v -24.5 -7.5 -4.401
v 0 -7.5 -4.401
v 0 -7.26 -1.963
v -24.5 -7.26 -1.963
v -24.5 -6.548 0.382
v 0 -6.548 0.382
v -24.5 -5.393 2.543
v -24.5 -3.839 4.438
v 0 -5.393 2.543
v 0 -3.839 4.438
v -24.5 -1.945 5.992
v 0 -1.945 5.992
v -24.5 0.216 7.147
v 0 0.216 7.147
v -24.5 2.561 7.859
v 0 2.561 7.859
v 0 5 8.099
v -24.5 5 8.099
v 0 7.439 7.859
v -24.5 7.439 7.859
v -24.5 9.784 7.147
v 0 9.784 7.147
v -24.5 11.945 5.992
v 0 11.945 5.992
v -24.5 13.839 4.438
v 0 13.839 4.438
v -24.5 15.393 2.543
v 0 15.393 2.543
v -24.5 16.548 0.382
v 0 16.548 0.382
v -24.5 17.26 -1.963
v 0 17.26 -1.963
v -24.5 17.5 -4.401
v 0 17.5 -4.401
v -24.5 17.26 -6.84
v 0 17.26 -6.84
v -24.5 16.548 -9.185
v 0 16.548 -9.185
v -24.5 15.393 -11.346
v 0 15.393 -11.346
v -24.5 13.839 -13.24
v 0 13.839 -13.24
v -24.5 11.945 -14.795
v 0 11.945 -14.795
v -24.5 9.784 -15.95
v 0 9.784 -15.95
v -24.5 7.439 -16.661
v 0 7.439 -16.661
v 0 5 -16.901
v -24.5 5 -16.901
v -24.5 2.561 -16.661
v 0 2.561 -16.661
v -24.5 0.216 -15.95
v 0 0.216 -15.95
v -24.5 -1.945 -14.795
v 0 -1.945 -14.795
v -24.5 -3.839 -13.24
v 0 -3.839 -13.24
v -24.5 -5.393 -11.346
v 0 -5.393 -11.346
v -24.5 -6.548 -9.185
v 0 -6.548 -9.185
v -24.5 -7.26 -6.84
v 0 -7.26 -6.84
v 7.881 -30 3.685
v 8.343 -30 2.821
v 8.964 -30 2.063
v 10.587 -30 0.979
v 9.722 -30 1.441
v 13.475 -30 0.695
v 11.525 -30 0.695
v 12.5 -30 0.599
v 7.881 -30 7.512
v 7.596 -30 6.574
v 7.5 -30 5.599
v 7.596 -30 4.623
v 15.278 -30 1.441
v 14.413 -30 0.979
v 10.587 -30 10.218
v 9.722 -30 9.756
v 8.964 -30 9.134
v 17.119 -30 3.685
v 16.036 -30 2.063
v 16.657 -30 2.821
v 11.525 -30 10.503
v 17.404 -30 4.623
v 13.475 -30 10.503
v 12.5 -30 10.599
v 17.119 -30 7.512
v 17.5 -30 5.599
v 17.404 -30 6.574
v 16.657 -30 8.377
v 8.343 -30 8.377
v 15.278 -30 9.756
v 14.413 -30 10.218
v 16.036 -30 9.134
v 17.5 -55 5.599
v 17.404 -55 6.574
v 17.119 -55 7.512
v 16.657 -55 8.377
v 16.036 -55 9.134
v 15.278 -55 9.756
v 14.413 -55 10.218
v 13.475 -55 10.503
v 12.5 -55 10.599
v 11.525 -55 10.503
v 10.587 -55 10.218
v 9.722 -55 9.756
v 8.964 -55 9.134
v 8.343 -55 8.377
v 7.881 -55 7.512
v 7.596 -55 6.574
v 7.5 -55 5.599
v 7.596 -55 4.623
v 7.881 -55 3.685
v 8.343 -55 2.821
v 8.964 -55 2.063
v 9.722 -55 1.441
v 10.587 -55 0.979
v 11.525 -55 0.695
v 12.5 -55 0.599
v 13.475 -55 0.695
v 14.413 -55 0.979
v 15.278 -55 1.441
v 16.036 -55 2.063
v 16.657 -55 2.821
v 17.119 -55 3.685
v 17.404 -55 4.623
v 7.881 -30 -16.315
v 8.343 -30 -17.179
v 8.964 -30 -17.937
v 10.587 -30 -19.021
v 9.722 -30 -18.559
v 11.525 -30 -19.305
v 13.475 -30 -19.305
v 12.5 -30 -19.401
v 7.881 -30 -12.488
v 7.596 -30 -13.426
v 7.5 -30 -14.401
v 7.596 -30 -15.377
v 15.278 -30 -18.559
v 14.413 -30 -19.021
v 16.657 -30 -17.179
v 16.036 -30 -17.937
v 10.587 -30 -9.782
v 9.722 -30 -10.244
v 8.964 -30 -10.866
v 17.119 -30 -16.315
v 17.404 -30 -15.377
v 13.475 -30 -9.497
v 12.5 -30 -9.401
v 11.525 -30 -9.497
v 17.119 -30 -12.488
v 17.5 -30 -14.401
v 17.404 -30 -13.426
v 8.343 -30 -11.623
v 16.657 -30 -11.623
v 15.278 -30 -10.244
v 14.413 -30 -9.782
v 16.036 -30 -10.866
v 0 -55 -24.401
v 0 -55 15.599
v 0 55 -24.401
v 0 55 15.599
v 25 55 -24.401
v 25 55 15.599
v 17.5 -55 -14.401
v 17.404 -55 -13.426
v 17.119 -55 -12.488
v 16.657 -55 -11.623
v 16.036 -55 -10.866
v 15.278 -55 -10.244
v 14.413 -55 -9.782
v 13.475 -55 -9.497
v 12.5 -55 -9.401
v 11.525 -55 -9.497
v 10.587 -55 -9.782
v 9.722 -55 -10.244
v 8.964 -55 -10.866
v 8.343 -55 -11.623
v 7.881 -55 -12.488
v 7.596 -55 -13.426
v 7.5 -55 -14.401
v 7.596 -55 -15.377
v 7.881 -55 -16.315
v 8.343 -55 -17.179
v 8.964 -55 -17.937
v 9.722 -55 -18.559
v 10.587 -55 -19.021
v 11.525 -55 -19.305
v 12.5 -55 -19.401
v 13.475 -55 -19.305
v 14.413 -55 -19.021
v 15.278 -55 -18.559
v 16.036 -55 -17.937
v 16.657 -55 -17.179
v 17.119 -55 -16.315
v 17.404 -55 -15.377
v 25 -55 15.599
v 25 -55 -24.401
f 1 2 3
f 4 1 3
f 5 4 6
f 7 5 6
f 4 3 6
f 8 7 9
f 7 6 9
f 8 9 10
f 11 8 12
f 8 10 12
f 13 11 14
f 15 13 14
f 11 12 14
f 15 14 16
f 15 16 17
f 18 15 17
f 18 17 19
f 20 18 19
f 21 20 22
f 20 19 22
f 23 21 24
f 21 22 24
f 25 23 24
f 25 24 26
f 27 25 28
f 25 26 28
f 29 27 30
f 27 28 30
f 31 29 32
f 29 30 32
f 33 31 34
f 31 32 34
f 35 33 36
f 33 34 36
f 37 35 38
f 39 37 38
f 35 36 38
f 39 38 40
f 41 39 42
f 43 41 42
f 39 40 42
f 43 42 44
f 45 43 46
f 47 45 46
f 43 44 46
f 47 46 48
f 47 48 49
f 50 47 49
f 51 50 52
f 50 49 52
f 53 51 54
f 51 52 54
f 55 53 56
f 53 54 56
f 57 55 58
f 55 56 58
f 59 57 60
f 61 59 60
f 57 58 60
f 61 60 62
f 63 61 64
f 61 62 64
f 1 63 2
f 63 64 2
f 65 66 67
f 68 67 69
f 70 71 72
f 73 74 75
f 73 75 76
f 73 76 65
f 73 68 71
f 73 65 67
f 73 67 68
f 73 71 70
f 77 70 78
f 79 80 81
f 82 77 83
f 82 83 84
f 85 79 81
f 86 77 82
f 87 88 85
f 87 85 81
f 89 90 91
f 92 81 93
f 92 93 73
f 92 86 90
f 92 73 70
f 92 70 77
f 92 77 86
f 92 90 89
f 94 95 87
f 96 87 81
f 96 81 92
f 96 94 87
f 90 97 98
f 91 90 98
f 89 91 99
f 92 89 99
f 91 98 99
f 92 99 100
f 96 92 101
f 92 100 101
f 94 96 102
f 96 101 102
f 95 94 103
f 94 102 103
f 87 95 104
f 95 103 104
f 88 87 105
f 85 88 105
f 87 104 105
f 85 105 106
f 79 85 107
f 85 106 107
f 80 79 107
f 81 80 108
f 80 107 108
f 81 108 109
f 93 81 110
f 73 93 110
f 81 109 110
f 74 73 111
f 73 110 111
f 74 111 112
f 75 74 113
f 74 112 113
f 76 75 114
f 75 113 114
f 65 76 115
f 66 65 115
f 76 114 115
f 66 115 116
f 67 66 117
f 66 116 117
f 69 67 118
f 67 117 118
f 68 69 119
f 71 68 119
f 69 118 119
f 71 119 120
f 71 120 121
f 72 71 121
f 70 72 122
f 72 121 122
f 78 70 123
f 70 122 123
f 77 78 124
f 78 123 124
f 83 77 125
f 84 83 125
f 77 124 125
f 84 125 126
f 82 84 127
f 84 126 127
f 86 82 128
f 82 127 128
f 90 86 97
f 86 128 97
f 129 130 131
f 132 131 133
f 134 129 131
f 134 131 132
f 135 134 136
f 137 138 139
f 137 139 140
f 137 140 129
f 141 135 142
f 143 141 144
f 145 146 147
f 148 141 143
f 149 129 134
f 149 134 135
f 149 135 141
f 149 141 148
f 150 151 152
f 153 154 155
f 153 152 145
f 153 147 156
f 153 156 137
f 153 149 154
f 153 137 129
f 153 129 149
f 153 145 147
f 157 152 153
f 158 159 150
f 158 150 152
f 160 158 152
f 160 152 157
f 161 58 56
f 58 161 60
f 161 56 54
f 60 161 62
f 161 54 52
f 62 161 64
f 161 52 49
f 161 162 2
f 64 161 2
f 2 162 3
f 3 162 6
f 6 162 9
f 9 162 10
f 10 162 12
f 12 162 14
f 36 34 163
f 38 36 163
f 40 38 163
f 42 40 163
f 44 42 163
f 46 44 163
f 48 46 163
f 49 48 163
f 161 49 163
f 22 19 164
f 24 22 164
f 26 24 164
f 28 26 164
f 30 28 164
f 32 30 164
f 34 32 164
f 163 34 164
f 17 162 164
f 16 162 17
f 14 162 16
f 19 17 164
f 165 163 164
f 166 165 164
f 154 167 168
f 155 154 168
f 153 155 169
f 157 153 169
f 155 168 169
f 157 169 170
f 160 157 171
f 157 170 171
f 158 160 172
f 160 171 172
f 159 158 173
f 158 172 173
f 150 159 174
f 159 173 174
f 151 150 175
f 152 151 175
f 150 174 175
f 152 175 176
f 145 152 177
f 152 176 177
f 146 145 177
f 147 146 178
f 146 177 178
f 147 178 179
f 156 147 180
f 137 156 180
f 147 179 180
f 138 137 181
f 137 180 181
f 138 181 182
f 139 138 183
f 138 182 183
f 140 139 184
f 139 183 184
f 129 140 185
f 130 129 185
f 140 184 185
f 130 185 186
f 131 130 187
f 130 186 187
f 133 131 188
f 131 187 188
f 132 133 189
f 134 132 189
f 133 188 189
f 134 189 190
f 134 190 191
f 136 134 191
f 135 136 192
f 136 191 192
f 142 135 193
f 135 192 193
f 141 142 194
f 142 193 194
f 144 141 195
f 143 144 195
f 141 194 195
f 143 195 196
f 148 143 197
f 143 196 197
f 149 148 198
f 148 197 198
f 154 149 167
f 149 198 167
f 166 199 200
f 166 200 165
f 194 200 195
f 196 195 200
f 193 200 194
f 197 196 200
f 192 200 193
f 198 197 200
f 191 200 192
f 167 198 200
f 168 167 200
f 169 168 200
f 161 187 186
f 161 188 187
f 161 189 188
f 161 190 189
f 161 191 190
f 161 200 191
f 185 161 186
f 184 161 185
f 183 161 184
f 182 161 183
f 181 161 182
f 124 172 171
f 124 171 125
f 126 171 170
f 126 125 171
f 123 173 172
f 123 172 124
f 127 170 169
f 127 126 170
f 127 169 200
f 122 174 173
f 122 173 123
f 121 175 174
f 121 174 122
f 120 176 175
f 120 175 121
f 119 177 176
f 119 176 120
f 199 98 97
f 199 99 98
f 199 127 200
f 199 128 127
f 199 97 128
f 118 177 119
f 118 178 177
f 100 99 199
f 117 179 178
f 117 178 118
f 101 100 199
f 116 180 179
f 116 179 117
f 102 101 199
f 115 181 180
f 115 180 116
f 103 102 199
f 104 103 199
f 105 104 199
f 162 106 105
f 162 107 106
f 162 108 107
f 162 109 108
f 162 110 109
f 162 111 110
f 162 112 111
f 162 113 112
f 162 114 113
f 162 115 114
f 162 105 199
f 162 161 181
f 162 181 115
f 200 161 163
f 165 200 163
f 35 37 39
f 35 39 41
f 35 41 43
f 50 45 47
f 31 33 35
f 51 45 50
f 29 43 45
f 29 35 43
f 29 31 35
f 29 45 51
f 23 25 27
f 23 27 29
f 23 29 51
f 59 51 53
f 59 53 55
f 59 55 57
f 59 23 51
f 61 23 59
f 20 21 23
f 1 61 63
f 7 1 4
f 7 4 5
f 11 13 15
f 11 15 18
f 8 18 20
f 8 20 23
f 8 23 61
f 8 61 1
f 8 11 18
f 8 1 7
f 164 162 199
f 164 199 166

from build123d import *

# Parameters (mm, degrees)
F0_W     = 110
F0_H     = 40
F1_DEPTH = 25
F2_R     = 12.5
F3_DEPTH = 24.5
F4_R     = 5
F5_DEPTH = 25
F6_DEPTH = 25


with BuildPart() as f1:
    # F0 (on Right) → F1 (new body)
    with BuildSketch(Plane.YZ):
        with Locations((0, -4.401192)):
            Rectangle(F0_W, F0_H)
    extrude(amount=F1_DEPTH)

    # F2 (on face) → F3 (join)
    with BuildSketch(Plane(origin=(0, 0, 0), x_dir=(0, -1, 0), z_dir=(-1, 0, 0))):
        with Locations((-5, -4.401192)):
            Circle(F2_R)
    extrude(amount=F3_DEPTH)

    # F4 (on face) → F5 (cut)
    with BuildSketch(Plane.XZ.offset(55)):
        with Locations((12.5, 5.598808)):
            Circle(F4_R)
    extrude(amount=-F5_DEPTH, mode=Mode.SUBTRACT)

    # F4 (on face) → F6 (cut)
    with BuildSketch(Plane.XZ.offset(55)):
        with Locations((12.5, 5.598808)):
            Circle(F4_R)
        with Locations((12.5, -14.401192)):
            Circle(F4_R)
    extrude(amount=-F6_DEPTH, mode=Mode.SUBTRACT)


solid = f1.part
